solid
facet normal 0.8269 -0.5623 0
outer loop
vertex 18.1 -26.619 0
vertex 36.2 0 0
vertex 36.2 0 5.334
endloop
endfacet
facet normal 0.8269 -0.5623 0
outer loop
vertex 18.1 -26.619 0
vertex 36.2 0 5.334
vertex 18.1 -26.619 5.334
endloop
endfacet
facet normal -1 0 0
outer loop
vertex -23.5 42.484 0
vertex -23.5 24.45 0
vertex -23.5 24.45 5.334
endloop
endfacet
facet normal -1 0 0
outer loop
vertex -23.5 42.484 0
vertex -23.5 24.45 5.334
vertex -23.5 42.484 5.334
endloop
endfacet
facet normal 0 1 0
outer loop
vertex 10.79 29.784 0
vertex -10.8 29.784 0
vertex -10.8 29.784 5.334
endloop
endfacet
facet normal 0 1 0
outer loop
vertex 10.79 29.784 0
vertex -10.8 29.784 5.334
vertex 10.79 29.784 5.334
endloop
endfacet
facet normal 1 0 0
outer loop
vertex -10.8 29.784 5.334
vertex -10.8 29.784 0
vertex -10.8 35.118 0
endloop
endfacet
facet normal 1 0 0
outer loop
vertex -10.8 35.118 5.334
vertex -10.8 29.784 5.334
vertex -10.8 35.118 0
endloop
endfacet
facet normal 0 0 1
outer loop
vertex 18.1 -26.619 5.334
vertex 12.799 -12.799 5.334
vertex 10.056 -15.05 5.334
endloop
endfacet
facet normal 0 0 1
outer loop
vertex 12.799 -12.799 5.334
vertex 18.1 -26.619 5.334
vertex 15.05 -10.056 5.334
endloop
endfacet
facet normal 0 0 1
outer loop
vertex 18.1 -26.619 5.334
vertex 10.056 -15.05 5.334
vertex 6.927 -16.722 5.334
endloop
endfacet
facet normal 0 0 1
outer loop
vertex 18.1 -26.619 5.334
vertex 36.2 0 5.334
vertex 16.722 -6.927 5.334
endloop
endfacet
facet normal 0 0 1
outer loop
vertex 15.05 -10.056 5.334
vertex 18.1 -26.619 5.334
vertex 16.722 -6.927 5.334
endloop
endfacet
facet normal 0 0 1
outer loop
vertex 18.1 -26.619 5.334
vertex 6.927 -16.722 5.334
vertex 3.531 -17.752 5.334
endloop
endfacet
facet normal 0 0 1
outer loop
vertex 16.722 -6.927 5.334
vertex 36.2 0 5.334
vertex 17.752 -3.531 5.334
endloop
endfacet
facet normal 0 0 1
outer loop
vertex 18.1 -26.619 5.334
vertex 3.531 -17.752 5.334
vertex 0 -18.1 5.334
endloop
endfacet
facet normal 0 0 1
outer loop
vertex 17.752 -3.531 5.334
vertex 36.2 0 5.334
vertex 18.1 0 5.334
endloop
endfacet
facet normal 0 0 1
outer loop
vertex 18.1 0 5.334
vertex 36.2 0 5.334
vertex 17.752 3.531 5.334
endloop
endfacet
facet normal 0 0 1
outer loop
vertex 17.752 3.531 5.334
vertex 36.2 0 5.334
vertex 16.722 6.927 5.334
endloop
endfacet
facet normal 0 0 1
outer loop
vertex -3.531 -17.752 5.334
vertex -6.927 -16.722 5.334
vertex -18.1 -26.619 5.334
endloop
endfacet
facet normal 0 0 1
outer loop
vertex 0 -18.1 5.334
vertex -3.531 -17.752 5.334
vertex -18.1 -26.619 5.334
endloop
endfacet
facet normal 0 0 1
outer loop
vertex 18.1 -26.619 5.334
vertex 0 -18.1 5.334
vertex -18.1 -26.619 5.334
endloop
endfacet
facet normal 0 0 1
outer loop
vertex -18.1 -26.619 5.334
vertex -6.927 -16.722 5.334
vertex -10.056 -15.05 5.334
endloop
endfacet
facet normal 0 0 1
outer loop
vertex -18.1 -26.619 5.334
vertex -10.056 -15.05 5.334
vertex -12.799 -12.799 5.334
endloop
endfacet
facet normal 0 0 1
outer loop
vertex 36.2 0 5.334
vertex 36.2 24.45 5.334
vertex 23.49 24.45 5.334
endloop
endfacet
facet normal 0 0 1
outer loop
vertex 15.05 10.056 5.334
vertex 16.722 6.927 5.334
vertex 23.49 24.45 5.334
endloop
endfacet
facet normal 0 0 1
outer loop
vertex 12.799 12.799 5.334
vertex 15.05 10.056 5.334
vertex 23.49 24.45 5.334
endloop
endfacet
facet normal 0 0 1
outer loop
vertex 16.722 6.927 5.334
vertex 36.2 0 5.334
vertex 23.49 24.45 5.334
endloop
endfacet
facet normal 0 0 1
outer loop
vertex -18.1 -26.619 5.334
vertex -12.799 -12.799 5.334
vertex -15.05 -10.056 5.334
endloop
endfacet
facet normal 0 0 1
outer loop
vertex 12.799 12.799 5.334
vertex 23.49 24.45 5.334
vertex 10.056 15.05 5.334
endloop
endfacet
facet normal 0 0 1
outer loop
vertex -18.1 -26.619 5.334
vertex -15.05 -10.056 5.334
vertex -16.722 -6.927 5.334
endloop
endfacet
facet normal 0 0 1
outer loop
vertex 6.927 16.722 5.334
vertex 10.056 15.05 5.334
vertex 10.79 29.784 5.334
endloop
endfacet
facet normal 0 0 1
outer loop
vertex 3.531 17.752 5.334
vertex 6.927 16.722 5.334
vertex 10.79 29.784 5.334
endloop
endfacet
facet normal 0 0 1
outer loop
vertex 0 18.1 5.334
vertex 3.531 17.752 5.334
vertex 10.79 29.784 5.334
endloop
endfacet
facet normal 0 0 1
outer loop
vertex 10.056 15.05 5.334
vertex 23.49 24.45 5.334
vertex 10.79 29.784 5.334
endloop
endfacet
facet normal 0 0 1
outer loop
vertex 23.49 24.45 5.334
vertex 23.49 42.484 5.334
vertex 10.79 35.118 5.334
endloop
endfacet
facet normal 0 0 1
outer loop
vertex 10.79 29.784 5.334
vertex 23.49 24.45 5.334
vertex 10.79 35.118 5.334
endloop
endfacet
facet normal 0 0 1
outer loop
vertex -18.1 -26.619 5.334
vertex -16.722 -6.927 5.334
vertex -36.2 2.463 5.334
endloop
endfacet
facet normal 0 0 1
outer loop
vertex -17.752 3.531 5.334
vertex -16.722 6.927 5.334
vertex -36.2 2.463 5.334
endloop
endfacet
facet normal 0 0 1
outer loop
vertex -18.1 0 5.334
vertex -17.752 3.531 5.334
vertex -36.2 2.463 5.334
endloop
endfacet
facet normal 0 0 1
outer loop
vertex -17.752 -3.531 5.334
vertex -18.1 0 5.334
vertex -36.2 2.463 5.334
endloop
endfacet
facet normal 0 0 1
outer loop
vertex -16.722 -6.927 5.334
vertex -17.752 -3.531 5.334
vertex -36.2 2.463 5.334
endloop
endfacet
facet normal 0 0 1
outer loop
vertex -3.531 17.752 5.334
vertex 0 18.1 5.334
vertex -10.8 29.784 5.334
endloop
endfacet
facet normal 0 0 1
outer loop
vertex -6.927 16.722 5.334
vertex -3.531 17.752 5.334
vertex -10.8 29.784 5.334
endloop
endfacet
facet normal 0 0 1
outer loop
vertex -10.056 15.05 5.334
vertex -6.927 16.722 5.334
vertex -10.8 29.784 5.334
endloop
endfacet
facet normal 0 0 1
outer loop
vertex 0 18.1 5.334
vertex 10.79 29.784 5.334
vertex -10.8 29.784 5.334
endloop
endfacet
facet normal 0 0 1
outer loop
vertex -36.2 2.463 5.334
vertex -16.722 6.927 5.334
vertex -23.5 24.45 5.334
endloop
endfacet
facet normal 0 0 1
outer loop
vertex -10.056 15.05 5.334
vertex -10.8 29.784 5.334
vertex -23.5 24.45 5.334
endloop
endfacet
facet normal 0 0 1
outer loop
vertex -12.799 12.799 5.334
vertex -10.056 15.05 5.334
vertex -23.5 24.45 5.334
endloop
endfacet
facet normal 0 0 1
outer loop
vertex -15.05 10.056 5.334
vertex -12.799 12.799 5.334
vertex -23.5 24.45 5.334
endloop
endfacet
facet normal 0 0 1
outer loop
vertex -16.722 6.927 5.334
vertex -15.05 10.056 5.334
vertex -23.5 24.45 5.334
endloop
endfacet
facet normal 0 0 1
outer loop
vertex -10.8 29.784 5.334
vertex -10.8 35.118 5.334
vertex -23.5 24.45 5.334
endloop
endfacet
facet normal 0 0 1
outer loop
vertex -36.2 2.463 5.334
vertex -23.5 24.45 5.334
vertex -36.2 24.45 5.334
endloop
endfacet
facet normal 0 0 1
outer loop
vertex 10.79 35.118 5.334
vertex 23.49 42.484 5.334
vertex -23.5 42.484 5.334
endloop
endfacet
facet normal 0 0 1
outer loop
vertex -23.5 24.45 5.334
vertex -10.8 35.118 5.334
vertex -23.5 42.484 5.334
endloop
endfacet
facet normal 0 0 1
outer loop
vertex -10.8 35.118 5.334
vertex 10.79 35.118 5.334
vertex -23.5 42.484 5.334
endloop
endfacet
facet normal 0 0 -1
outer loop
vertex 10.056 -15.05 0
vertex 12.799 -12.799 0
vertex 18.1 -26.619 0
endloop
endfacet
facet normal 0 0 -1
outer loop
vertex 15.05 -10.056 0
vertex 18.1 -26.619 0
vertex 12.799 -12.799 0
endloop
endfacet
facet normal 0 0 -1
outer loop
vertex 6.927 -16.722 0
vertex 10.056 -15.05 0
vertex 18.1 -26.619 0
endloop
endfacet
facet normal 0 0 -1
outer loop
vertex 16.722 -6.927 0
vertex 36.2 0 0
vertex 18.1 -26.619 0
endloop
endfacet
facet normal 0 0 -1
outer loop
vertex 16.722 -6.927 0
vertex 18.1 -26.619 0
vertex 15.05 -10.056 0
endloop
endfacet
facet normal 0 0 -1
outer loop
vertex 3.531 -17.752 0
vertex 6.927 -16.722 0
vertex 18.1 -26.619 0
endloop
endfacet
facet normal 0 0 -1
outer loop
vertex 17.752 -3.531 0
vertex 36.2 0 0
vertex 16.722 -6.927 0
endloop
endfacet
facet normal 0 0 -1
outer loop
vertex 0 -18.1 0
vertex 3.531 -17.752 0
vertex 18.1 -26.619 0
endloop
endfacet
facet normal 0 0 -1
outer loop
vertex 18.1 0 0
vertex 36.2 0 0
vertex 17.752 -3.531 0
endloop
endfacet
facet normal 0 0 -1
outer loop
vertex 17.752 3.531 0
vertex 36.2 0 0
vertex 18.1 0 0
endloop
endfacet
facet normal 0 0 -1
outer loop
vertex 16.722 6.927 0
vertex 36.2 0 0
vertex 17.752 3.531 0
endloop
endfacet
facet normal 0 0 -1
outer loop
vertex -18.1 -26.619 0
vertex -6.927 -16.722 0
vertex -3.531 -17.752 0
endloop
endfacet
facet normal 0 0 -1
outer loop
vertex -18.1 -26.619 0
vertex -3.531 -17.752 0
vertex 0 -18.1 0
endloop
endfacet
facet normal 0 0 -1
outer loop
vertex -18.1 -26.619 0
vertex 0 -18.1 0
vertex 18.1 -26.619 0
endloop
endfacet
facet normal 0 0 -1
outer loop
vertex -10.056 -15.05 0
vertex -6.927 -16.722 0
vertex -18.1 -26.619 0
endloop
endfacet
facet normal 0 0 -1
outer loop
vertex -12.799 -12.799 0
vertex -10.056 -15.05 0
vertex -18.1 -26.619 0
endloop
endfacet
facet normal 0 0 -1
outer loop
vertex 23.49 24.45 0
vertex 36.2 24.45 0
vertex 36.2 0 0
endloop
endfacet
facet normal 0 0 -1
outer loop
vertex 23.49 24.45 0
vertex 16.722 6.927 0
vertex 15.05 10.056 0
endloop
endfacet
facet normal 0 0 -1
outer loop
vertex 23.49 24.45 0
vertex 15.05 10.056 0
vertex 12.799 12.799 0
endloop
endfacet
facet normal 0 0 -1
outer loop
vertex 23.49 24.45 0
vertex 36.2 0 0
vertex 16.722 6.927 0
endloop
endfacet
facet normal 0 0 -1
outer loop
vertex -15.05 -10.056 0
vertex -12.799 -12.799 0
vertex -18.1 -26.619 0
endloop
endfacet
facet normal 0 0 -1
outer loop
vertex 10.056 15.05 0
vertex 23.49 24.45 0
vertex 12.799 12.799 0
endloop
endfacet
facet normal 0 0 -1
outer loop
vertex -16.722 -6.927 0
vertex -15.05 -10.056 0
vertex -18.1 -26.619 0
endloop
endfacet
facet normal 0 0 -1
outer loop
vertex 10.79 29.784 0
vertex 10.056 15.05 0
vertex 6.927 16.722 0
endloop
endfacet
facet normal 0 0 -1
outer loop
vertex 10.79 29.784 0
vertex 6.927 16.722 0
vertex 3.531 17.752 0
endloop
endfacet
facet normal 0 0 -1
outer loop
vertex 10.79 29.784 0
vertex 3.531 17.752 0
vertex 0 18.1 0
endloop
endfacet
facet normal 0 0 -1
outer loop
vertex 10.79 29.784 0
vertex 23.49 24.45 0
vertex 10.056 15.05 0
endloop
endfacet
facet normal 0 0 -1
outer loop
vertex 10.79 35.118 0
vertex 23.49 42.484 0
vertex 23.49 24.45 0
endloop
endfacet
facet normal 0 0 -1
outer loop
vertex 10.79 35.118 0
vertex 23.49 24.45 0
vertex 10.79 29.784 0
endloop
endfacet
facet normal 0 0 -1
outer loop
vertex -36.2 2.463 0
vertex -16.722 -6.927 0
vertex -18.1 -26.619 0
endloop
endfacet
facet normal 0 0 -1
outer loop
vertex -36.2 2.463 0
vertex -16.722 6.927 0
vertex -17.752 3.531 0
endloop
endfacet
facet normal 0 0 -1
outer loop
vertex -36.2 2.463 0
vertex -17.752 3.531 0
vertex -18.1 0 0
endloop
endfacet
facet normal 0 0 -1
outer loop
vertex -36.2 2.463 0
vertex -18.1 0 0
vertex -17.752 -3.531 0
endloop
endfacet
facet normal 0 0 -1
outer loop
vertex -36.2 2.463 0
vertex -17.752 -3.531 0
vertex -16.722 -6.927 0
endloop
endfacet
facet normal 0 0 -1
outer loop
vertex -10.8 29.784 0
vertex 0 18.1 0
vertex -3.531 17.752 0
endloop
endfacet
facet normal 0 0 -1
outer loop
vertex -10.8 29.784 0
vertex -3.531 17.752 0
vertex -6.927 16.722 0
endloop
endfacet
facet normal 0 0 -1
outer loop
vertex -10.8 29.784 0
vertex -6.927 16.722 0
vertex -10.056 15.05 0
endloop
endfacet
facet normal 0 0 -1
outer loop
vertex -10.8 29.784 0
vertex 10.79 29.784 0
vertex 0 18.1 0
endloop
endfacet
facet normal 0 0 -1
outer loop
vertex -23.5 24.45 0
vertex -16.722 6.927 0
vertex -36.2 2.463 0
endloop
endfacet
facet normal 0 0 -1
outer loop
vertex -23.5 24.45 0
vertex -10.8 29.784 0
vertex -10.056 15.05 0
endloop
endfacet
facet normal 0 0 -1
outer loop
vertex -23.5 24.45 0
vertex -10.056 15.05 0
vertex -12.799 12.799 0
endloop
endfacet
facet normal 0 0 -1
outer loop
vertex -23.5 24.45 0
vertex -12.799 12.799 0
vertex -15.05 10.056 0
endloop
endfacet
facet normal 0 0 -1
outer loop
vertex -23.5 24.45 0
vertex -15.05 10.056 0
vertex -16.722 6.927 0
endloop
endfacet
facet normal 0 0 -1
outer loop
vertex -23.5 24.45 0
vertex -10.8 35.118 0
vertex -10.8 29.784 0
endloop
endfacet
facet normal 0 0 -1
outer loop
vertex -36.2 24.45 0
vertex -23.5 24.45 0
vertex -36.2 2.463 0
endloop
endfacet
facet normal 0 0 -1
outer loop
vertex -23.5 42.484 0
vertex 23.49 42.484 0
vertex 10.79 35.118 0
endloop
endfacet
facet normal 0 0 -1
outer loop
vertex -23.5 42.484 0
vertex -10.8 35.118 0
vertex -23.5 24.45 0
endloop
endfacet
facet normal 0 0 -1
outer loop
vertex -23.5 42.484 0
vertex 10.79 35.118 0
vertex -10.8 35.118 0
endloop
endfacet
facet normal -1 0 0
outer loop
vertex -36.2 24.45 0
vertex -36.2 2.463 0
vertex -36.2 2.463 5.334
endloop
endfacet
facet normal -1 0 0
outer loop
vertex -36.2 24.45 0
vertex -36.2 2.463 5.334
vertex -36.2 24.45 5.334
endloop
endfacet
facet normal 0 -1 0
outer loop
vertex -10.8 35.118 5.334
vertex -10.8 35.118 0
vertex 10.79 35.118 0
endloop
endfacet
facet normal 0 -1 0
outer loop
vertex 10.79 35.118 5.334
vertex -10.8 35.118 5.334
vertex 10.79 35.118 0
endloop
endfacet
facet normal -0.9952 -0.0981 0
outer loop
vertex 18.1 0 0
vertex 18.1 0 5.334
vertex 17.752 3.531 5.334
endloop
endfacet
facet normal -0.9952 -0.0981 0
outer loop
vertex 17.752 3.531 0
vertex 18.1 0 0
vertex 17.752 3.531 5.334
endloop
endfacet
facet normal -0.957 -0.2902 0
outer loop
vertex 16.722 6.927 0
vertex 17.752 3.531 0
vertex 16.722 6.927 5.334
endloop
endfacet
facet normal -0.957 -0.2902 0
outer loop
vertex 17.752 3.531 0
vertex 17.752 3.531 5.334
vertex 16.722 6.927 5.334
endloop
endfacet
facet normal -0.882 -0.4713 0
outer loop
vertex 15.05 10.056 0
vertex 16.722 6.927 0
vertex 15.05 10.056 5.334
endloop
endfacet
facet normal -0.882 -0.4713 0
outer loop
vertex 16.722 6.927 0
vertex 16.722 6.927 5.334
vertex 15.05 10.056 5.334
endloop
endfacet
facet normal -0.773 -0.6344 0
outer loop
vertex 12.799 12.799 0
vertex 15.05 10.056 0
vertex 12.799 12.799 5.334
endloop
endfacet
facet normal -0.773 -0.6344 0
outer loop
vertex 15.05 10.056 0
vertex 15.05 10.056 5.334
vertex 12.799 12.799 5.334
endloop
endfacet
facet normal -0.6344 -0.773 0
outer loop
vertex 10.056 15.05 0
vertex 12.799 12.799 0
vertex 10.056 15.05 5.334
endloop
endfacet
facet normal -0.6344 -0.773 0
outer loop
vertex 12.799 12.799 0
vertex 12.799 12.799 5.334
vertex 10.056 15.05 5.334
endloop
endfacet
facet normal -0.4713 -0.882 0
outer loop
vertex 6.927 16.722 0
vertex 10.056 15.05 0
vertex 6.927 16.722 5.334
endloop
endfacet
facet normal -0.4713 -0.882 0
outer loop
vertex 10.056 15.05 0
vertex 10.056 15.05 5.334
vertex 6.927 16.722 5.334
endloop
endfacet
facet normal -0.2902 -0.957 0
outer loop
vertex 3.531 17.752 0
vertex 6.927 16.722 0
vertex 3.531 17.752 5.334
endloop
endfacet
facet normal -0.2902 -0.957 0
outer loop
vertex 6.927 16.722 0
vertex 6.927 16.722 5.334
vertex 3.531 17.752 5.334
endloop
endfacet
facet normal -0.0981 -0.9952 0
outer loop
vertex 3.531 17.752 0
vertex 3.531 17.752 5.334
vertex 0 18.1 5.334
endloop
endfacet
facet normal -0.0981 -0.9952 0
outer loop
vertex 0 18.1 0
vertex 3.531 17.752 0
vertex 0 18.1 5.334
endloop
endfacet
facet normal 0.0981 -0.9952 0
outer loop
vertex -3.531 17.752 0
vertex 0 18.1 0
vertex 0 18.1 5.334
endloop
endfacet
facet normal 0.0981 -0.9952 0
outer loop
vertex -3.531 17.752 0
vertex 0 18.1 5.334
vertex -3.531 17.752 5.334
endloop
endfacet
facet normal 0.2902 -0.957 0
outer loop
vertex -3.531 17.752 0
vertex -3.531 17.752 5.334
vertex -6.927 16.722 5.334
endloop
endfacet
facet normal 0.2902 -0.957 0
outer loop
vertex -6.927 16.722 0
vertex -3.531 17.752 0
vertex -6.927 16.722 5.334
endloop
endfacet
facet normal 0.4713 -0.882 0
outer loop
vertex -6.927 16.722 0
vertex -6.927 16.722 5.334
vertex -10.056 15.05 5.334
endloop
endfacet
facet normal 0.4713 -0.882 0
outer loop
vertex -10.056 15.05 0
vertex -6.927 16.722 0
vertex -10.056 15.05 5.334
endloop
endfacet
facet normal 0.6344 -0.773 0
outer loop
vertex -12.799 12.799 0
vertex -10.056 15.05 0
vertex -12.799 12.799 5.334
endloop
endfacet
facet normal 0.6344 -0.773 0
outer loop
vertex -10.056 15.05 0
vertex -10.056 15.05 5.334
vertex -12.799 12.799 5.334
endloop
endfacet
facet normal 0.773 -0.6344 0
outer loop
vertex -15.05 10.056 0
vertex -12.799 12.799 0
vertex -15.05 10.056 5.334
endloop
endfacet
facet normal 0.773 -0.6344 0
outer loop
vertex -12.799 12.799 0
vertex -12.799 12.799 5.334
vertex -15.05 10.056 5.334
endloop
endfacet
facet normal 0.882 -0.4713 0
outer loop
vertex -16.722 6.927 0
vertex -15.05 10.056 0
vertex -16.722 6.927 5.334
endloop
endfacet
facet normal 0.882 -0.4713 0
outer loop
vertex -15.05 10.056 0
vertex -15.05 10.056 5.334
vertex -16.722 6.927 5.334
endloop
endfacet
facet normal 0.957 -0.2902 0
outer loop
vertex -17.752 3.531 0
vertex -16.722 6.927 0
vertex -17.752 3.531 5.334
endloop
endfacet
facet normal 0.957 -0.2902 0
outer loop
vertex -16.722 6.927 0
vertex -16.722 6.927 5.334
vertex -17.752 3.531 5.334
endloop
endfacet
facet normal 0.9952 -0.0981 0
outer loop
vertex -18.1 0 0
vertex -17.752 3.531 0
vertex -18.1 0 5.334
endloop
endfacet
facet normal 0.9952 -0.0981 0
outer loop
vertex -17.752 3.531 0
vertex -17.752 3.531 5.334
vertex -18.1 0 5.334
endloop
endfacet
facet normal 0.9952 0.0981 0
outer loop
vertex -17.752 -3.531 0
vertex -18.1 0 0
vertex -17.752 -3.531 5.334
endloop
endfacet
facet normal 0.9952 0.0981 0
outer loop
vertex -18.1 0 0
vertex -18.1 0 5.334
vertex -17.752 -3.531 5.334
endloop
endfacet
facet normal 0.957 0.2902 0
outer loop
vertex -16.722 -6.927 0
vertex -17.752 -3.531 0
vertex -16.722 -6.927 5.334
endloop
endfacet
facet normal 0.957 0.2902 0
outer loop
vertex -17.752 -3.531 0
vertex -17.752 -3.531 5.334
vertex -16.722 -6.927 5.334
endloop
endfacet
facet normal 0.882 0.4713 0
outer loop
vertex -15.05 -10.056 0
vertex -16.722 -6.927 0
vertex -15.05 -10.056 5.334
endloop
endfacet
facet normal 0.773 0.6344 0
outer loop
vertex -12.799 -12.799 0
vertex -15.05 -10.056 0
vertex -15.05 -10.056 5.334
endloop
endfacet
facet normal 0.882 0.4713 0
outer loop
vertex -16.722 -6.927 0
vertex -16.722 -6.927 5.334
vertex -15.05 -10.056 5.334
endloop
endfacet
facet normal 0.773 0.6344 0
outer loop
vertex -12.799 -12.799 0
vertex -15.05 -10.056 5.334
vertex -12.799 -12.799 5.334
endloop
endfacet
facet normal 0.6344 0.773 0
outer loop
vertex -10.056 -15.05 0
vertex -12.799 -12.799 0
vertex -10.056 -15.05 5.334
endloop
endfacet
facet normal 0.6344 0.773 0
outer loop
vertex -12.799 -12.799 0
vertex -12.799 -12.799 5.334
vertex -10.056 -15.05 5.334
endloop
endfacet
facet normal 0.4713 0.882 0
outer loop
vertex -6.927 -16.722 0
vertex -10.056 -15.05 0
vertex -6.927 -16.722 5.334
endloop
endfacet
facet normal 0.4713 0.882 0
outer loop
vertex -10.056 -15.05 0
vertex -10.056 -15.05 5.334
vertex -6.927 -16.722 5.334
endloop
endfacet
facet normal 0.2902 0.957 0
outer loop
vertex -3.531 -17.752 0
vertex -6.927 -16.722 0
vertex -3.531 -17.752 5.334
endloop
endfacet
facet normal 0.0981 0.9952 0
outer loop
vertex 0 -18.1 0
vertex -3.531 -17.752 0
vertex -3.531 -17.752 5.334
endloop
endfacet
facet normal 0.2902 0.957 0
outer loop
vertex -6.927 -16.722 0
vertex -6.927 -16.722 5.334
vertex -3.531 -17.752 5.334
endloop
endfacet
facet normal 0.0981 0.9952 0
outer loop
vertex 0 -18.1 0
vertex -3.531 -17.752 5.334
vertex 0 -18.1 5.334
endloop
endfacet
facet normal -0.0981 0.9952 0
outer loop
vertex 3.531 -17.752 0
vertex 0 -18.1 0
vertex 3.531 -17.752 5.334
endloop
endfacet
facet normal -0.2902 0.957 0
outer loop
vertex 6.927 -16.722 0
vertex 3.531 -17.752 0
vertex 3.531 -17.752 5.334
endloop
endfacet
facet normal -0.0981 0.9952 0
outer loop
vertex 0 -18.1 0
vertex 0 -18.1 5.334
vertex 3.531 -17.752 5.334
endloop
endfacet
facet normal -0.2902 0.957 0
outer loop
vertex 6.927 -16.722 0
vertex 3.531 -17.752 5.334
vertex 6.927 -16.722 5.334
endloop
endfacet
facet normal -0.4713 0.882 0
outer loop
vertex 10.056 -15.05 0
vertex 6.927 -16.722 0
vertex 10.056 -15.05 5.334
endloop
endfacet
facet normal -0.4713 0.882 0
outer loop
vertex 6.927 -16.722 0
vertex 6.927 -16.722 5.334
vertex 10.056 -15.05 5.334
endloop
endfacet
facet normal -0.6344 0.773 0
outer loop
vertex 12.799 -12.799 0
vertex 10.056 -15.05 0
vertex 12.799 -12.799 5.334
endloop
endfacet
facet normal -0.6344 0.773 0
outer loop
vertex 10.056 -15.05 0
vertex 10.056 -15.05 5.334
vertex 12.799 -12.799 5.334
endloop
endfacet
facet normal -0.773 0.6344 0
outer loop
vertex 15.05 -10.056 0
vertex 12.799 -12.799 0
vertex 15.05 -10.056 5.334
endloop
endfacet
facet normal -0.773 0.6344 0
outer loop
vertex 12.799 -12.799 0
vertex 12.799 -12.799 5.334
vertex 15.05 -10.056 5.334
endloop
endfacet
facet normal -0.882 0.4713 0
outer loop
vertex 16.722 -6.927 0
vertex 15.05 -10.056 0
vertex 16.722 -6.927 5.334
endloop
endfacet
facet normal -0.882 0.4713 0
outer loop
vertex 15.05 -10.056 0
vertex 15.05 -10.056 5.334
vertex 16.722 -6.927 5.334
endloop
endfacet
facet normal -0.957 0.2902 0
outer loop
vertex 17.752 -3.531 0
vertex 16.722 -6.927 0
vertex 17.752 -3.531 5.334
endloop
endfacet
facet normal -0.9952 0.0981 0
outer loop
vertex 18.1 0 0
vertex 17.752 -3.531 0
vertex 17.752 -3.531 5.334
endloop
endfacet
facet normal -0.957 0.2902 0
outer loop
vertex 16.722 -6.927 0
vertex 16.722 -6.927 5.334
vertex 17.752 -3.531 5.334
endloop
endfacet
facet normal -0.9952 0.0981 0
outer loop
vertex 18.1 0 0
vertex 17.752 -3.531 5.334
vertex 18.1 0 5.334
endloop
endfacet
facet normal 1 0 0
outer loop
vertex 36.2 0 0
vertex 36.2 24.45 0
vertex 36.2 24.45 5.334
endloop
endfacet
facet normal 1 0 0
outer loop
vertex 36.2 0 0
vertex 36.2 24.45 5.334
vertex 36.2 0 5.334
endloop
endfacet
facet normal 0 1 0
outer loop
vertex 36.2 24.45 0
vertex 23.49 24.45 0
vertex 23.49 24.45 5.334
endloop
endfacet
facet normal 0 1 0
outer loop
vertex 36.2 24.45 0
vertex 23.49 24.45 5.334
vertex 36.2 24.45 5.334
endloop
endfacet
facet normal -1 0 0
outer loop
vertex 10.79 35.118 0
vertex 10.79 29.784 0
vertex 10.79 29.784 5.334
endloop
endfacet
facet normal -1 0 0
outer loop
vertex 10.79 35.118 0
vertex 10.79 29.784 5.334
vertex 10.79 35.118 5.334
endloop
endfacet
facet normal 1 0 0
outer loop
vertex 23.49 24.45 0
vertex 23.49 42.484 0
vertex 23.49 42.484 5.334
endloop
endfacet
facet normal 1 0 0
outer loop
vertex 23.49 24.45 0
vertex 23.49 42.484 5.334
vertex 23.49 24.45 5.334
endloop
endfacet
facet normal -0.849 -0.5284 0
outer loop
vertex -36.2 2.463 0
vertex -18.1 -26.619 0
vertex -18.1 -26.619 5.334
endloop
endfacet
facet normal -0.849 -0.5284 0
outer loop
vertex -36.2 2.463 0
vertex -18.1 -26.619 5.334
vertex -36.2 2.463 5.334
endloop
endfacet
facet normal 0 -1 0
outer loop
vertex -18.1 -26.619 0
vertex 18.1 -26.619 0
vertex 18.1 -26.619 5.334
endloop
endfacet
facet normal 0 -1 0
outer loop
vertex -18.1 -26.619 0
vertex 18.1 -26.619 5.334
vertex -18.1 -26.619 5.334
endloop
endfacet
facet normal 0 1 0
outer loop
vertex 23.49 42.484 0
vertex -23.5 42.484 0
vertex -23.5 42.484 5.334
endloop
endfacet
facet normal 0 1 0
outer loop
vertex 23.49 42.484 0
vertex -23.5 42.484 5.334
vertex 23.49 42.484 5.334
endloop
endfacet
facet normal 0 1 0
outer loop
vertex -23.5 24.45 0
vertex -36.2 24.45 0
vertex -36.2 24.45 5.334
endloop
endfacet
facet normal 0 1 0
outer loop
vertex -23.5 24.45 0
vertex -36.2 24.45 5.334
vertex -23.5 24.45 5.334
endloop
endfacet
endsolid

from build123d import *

# Parameters (mm, degrees)
SKETCH1_W           = 21.59
SKETCH1_H           = 5.334
BOSS_EXTRUDE1_DEPTH = 5.334
SKETCH2_R           = 18.1
CUT_EXTRUDE1_DEPTH  = 5.334


with BuildPart() as part:
    # Sketch1 → Boss-Extrude1 (new body)
    with BuildSketch(Plane.XY):
        Polygon((-36.2, 24.449992223), (-23.5, 24.449992223), (-23.5, 42.483992223), (23.49, 42.483992223), (23.49, 24.449992223), (36.2, 24.449992223), (36.2, -7.777e-06), (18.1, -26.619054692), (-18.1, -26.619054692), (-36.2, 2.462571049), align=None)
        with Locations((-0.005, 32.451)):
            Rectangle(SKETCH1_W, SKETCH1_H, mode=Mode.SUBTRACT)
    extrude(amount=BOSS_EXTRUDE1_DEPTH)

    # Sketch2 → Cut-Extrude1 (cut)
    with BuildSketch(Plane.XY.offset(5.334)):
        Circle(SKETCH2_R)
    extrude(amount=-CUT_EXTRUDE1_DEPTH, mode=Mode.SUBTRACT)


solid = part.part
